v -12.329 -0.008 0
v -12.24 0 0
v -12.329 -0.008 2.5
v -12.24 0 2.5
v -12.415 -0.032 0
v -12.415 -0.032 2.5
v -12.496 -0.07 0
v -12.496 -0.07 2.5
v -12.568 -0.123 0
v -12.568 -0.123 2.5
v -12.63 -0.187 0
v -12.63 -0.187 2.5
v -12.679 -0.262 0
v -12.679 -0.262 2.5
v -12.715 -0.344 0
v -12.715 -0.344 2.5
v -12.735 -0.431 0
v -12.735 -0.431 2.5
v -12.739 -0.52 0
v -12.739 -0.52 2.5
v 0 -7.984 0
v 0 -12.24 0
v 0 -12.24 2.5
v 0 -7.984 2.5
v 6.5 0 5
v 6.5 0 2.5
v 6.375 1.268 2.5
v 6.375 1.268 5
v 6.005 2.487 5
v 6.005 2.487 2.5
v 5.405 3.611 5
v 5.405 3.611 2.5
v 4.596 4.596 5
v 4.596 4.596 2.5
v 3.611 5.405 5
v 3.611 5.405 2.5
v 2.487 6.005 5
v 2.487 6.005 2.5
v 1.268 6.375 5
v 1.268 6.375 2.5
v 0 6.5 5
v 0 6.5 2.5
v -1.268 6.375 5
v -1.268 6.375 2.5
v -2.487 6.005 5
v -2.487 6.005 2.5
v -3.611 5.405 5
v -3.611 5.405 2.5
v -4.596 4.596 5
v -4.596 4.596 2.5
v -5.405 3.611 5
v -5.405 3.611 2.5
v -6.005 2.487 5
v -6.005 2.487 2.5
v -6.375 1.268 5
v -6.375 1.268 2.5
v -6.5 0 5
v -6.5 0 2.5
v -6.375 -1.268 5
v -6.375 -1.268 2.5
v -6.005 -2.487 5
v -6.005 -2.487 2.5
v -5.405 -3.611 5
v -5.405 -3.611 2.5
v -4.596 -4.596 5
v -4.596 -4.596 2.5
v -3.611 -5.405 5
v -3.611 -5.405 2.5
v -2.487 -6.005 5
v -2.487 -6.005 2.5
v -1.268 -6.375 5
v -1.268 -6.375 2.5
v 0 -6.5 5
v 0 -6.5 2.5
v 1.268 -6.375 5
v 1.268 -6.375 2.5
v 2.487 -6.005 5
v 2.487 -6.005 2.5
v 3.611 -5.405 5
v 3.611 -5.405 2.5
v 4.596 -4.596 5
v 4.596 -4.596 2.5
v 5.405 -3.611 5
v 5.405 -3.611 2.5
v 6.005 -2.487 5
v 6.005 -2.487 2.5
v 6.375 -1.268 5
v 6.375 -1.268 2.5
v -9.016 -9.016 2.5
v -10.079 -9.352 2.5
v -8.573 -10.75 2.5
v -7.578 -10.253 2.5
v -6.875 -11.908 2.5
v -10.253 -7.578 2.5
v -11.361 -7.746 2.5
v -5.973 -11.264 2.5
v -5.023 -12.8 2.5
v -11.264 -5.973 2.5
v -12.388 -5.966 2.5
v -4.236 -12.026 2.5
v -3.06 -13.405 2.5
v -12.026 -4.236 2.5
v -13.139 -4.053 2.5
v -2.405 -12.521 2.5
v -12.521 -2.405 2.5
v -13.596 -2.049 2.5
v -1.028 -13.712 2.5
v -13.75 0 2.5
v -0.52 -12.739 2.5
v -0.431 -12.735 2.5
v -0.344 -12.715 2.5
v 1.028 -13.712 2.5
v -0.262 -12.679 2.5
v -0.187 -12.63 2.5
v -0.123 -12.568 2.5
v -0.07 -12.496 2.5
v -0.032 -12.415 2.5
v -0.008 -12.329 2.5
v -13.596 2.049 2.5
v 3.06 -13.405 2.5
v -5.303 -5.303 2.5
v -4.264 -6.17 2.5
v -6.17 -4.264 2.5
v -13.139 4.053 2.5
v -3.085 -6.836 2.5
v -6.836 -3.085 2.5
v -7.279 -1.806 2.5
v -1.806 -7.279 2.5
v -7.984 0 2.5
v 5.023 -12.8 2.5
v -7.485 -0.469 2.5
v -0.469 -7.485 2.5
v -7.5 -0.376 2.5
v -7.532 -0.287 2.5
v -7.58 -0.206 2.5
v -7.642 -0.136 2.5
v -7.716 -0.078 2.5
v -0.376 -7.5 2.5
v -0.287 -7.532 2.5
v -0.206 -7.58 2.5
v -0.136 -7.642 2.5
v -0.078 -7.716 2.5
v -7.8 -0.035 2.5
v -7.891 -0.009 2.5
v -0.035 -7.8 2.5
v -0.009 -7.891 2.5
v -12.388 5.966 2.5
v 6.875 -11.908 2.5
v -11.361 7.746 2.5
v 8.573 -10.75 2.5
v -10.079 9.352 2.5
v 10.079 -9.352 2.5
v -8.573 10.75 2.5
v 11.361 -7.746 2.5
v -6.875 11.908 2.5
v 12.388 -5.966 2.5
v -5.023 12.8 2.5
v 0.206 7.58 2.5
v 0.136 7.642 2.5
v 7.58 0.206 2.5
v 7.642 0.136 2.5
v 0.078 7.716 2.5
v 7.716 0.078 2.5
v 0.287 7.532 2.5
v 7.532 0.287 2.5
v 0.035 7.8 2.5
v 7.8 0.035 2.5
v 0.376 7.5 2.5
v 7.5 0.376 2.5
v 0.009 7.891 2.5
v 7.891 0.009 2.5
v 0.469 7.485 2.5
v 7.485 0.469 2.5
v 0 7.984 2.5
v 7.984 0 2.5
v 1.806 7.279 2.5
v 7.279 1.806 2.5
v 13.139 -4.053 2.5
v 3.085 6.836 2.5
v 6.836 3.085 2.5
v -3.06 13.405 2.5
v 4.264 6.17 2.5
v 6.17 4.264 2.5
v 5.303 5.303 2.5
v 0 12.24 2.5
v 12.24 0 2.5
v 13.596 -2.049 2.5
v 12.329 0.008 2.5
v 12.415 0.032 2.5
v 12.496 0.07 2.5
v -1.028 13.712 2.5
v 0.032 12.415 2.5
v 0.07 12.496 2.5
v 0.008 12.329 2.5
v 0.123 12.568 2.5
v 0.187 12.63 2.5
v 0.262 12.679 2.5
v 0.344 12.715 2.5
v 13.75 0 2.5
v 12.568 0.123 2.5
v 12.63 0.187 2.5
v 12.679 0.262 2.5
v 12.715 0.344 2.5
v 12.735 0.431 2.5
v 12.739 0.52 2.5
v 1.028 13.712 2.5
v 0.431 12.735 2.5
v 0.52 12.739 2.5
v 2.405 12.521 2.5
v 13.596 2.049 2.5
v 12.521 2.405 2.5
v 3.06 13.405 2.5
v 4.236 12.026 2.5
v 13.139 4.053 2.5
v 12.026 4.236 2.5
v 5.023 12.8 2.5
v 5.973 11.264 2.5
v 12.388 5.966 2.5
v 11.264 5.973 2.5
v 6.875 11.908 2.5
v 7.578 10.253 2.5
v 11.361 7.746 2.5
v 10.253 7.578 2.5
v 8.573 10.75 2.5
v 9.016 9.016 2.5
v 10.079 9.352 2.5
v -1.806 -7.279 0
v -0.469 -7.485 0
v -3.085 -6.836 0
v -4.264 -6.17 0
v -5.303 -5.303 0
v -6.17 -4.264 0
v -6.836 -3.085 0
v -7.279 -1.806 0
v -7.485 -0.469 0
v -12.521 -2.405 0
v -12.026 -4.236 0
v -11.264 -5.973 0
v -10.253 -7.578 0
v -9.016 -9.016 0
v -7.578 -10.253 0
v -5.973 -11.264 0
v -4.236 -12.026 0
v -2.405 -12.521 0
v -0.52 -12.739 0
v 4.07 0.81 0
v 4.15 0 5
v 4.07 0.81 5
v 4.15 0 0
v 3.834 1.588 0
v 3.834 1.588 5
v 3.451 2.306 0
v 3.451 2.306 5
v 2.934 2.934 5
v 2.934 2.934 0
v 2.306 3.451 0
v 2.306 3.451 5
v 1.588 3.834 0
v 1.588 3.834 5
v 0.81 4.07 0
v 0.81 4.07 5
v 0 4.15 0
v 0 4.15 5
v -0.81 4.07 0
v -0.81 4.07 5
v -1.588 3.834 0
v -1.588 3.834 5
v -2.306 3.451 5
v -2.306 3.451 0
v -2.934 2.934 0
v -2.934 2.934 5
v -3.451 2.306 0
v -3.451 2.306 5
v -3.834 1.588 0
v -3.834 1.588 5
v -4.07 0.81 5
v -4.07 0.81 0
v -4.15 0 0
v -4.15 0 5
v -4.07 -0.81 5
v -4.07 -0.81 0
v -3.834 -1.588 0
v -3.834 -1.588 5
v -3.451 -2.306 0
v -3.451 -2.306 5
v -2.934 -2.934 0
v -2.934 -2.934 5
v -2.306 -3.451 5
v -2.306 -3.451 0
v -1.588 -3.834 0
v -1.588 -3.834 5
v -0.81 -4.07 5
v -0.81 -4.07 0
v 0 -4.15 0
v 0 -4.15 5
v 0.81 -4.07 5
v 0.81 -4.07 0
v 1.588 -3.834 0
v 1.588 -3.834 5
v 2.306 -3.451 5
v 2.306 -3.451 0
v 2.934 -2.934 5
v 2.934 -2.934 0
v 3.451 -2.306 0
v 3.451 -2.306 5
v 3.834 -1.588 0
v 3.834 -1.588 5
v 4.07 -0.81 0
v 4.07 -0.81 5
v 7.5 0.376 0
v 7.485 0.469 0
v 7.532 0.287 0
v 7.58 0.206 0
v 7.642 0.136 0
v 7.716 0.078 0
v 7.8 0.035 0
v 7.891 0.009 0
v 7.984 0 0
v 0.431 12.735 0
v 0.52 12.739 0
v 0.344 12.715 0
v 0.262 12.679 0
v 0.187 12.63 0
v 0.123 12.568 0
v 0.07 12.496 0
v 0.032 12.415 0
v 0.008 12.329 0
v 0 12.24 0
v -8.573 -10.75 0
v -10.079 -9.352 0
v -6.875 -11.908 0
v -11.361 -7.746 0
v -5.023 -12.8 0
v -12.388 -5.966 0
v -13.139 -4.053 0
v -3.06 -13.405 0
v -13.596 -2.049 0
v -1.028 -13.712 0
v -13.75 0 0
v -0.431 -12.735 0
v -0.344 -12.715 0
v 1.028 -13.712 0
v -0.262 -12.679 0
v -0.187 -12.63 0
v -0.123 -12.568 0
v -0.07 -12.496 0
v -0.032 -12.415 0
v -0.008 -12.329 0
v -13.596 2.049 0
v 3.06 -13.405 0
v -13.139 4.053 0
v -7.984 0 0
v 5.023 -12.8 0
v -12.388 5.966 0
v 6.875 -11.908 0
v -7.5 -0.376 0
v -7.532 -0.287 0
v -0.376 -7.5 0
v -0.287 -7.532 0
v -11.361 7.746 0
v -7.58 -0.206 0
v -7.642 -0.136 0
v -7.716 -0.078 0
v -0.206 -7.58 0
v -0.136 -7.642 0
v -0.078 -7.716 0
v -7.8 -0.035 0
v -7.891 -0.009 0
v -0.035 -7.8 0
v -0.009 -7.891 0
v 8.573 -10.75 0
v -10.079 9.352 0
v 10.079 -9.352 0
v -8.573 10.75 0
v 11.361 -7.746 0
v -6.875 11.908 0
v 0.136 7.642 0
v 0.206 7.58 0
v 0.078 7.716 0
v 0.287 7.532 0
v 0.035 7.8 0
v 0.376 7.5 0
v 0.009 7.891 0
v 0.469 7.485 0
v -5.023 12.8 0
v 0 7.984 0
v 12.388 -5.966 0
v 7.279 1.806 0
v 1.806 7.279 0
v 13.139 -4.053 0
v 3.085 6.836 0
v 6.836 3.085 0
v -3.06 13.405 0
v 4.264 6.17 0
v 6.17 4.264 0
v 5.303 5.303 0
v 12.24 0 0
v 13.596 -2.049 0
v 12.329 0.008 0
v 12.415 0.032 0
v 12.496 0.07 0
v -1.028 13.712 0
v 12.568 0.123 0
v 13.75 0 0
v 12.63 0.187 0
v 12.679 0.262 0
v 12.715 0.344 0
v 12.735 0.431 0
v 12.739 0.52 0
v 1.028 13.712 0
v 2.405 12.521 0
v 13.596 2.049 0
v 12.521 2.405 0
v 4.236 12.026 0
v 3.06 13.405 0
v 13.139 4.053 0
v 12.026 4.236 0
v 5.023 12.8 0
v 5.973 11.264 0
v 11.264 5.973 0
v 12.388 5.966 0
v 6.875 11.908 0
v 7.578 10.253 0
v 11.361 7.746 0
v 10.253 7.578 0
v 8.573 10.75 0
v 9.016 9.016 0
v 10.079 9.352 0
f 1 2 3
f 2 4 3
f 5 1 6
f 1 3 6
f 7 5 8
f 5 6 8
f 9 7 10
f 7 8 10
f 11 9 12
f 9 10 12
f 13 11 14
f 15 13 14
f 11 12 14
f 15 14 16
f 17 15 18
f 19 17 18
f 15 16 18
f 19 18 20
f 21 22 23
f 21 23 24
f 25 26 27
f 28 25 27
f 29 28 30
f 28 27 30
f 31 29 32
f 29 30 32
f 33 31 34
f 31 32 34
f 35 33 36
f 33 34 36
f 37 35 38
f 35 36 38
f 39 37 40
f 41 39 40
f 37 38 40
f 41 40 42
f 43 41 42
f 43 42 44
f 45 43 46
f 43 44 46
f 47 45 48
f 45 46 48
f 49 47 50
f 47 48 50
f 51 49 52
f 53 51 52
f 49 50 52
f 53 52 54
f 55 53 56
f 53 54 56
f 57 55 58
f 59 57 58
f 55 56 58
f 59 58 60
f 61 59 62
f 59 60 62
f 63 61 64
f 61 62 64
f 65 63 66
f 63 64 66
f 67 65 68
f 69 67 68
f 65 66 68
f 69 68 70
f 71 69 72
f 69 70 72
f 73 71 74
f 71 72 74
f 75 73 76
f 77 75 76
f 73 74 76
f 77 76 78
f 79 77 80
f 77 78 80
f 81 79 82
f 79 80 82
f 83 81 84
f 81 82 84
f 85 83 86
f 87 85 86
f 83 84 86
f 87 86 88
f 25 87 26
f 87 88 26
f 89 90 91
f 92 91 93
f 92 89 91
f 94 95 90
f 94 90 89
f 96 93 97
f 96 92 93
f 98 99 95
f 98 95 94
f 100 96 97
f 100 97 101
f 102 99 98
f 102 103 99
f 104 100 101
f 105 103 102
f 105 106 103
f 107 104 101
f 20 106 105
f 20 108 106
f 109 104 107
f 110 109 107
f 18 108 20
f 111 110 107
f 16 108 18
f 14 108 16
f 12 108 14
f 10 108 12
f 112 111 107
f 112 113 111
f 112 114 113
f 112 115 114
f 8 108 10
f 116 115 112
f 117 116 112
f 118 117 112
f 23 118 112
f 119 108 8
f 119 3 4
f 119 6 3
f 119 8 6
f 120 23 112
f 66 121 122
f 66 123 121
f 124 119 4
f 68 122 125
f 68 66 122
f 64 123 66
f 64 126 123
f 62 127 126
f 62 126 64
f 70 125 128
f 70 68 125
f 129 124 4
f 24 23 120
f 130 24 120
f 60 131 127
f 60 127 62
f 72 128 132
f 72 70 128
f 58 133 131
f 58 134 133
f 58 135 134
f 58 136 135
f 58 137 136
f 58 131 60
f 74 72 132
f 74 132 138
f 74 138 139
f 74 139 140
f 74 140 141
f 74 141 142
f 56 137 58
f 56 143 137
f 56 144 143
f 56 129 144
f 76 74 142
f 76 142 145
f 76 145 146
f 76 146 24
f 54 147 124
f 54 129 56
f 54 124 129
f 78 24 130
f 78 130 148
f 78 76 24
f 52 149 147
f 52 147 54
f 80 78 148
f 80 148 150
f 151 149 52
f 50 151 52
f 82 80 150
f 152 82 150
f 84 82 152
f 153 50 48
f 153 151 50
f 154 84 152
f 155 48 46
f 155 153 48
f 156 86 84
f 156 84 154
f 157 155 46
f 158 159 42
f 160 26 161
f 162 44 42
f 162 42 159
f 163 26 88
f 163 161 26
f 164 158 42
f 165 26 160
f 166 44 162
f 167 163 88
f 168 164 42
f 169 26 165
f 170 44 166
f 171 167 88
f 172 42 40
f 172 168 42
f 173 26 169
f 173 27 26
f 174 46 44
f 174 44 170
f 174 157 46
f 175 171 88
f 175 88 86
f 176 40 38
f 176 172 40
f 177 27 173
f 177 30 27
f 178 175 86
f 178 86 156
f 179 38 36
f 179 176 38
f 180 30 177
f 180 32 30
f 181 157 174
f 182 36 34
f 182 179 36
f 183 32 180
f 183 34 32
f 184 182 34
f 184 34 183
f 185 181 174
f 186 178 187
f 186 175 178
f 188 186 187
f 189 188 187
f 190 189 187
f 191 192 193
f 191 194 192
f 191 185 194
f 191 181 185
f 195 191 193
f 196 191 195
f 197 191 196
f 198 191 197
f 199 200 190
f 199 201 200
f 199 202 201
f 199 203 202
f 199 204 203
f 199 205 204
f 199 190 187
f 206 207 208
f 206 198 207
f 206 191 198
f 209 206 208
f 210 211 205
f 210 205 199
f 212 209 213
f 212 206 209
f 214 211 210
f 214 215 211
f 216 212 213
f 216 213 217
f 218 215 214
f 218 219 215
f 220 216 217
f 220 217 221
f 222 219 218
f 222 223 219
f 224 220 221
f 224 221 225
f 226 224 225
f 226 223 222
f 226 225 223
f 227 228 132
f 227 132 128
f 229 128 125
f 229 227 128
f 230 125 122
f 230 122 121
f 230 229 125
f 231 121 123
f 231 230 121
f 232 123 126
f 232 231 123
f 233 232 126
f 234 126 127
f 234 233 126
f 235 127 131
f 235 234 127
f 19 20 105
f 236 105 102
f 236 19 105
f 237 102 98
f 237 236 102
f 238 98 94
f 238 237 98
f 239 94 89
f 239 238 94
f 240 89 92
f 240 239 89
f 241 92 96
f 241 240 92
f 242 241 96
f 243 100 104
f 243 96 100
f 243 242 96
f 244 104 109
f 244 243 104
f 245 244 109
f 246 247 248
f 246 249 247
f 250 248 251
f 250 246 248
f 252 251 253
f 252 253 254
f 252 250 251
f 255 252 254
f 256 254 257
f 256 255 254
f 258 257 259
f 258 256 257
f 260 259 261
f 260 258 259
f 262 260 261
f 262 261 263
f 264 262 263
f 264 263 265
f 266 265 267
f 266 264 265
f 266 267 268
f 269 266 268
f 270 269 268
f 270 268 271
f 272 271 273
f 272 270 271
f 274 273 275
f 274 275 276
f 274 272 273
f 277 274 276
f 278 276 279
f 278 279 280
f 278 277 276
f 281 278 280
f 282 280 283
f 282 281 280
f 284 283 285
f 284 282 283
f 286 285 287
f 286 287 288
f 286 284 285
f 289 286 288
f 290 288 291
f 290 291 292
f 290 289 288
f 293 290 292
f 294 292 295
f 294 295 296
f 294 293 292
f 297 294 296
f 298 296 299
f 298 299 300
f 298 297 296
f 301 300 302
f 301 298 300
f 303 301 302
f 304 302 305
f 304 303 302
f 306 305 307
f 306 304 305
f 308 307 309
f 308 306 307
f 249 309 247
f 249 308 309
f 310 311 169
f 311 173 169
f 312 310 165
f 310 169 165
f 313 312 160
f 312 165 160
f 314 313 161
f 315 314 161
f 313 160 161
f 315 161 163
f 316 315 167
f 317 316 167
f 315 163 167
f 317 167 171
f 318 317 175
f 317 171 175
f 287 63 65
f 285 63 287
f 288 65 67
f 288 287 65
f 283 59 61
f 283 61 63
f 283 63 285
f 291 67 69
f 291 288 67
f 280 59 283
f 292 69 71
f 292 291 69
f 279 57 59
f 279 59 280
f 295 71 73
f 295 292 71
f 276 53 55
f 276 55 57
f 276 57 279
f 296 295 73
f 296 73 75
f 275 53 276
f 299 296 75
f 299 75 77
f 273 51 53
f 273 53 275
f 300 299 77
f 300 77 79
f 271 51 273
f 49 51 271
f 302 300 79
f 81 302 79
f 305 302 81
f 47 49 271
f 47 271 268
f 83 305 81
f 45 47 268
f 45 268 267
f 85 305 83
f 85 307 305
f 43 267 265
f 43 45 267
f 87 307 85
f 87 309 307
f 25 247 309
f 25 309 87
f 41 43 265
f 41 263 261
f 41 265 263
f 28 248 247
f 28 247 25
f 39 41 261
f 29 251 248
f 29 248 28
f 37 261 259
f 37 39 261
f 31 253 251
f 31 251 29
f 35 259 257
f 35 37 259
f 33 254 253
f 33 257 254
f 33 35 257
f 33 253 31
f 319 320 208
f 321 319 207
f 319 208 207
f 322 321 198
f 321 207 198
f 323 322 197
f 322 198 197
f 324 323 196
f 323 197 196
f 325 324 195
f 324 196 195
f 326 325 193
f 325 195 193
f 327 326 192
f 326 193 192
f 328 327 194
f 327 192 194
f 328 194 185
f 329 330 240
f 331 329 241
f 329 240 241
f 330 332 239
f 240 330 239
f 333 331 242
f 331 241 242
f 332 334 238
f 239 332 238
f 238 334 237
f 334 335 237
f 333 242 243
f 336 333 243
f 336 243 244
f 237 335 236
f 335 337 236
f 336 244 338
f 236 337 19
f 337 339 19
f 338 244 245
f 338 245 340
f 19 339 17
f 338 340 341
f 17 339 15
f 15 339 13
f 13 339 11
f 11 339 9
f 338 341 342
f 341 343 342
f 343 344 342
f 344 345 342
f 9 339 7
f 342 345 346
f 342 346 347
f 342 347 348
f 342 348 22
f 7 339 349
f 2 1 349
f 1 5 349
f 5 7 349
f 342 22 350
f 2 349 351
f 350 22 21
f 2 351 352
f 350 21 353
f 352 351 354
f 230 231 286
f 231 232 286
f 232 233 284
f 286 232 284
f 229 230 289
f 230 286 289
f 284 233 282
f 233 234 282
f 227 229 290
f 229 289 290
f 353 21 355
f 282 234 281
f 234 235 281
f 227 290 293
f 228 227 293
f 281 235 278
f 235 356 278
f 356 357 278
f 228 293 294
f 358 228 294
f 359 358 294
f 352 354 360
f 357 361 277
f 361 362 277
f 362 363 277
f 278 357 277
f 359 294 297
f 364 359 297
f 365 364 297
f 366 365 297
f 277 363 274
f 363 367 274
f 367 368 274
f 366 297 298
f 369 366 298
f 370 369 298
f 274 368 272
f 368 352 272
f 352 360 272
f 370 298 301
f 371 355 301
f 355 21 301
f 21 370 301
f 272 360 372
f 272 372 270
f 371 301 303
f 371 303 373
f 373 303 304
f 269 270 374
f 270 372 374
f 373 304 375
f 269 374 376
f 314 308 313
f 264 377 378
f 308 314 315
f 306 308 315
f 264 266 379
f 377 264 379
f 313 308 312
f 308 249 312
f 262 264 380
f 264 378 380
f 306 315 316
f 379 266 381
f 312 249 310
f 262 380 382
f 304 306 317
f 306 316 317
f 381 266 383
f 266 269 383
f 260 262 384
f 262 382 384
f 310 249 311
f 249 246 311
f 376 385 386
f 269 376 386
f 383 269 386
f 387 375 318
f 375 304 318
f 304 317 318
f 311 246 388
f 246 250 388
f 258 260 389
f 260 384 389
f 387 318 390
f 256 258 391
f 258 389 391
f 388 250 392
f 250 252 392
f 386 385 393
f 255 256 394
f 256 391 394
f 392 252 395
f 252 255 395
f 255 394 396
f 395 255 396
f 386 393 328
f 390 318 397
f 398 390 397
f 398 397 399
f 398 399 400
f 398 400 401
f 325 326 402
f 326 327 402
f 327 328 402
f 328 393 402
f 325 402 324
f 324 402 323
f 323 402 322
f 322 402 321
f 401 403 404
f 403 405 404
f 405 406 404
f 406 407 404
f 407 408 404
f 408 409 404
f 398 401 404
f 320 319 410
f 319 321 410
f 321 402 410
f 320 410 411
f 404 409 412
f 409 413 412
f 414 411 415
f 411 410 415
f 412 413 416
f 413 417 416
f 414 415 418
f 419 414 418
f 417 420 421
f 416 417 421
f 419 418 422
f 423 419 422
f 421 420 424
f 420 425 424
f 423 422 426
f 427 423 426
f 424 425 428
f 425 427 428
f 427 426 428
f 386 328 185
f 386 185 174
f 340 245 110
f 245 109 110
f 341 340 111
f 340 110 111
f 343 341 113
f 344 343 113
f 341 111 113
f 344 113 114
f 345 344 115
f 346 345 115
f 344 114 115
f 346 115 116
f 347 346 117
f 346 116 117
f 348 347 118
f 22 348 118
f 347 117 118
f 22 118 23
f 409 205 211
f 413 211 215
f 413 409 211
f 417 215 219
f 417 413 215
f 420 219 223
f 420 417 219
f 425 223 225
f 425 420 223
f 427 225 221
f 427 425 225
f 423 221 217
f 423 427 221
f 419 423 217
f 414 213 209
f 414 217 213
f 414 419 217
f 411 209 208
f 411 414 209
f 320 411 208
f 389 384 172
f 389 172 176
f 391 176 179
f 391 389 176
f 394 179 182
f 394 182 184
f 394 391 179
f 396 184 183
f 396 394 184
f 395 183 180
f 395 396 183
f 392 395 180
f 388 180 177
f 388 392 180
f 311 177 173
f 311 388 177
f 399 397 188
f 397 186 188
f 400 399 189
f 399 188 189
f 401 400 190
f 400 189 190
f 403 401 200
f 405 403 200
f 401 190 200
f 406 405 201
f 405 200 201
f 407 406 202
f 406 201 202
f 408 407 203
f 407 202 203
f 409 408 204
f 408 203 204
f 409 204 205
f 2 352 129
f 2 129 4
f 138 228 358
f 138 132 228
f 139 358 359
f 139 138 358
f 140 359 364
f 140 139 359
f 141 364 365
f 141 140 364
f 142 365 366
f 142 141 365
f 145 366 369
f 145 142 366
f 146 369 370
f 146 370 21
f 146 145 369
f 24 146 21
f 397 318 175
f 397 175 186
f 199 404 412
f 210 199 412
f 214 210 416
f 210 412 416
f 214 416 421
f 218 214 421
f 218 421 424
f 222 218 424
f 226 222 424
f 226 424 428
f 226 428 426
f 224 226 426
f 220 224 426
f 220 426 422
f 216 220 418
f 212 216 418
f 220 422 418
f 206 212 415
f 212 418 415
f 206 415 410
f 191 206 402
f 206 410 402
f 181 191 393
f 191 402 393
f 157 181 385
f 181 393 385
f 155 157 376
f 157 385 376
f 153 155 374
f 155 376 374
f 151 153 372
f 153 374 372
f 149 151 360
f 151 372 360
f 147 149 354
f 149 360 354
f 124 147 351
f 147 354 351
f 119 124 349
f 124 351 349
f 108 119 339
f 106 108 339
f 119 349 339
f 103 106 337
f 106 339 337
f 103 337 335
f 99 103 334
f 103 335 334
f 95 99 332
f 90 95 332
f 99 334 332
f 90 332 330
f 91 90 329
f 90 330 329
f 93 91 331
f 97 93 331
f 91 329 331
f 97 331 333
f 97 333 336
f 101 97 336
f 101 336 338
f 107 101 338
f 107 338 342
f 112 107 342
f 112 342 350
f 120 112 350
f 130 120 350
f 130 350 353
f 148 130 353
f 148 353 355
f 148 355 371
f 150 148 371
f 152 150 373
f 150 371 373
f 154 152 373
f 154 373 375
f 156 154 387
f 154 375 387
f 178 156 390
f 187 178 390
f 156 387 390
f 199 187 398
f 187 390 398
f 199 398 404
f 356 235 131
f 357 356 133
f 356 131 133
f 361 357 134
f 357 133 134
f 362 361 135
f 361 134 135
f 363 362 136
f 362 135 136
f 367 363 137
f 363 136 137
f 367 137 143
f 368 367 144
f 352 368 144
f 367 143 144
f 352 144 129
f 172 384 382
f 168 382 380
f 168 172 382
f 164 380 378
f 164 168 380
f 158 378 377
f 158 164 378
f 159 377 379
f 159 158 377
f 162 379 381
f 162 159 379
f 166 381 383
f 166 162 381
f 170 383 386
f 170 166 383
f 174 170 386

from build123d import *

# Parameters (mm, degrees)
SKETCH1_R                = 13.75
SKETCH1_R_2              = 4.15
BOSS_EXTRUDE1_DEPTH      = 2.5
SKETCH2_R                = 6.5
SKETCH2_R_2              = 4.15
BOSS_EXTRUDE2_DEPTH      = 2.5
CUT_EXTRUDE1_DEPTH       = 21.077973005
FILLET1_R                = 0.5
CIRPATTERN1_COUNT        = 2
FILLET1_OF_CIRPATTERN1_R = 0.5


with BuildPart() as part:
    # Sketch1 → Boss-Extrude1 (new body)
    with BuildSketch(Plane.XY):
        Circle(SKETCH1_R)
        Circle(SKETCH1_R_2, mode=Mode.SUBTRACT)
    extrude(amount=BOSS_EXTRUDE1_DEPTH)

    # Sketch2 → Boss-Extrude2 (add)
    with BuildSketch(Plane.XY.offset(2.5)):
        Circle(SKETCH2_R)
        Circle(SKETCH2_R_2, mode=Mode.SUBTRACT)
    extrude(amount=BOSS_EXTRUDE2_DEPTH)

    # Sketch5 → Cut-Extrude1 (cut, through all)
    with BuildSketch(Plane.XY):
        with BuildLine():
            Line((0, 12.75), (0, 7.5))
            ThreePointArc((0, 7.5), (5.303300859, 5.303300859), (7.5, 0))
            Line((7.5, 0), (12.75, 0))
            ThreePointArc((12.75, 0), (9.01561146, 9.01561146), (0, 12.75))
        make_face()
    cut_extrude1 = extrude(amount=CUT_EXTRUDE1_DEPTH, mode=Mode.SUBTRACT)

    # Fillet1
    fillet1_edges = [part.edges().sort_by_distance(p)[0] for p in [
        (0, 7.5, 1.25),
        (7.5, 0, 1.25),
        (12.75, 0, 1.25),
        (0, 12.75, 1.25),
    ]]
    fillet(fillet1_edges, radius=FILLET1_R)

    # CirPattern1: Cut-Extrude1 ×2 about axis
    cirpattern1_axis = Axis((0, 0, 0), (0, 0, 1))
    for i in range(1, CIRPATTERN1_COUNT):
        add(cut_extrude1.rotate(cirpattern1_axis, i * 360 / CIRPATTERN1_COUNT), mode=Mode.SUBTRACT)

    # Fillet1 of CirPattern1
    fillet1_of_cirpattern1_edges = [part.edges().sort_by_distance(p)[0] for p in [
        (0, -7.5, 1.25),
        (-7.5, 0, 1.25),
        (-12.75, 0, 1.25),
        (0, -12.75, 1.25),
    ]]
    fillet(fillet1_of_cirpattern1_edges, radius=FILLET1_OF_CIRPATTERN1_R)


solid = part.part
